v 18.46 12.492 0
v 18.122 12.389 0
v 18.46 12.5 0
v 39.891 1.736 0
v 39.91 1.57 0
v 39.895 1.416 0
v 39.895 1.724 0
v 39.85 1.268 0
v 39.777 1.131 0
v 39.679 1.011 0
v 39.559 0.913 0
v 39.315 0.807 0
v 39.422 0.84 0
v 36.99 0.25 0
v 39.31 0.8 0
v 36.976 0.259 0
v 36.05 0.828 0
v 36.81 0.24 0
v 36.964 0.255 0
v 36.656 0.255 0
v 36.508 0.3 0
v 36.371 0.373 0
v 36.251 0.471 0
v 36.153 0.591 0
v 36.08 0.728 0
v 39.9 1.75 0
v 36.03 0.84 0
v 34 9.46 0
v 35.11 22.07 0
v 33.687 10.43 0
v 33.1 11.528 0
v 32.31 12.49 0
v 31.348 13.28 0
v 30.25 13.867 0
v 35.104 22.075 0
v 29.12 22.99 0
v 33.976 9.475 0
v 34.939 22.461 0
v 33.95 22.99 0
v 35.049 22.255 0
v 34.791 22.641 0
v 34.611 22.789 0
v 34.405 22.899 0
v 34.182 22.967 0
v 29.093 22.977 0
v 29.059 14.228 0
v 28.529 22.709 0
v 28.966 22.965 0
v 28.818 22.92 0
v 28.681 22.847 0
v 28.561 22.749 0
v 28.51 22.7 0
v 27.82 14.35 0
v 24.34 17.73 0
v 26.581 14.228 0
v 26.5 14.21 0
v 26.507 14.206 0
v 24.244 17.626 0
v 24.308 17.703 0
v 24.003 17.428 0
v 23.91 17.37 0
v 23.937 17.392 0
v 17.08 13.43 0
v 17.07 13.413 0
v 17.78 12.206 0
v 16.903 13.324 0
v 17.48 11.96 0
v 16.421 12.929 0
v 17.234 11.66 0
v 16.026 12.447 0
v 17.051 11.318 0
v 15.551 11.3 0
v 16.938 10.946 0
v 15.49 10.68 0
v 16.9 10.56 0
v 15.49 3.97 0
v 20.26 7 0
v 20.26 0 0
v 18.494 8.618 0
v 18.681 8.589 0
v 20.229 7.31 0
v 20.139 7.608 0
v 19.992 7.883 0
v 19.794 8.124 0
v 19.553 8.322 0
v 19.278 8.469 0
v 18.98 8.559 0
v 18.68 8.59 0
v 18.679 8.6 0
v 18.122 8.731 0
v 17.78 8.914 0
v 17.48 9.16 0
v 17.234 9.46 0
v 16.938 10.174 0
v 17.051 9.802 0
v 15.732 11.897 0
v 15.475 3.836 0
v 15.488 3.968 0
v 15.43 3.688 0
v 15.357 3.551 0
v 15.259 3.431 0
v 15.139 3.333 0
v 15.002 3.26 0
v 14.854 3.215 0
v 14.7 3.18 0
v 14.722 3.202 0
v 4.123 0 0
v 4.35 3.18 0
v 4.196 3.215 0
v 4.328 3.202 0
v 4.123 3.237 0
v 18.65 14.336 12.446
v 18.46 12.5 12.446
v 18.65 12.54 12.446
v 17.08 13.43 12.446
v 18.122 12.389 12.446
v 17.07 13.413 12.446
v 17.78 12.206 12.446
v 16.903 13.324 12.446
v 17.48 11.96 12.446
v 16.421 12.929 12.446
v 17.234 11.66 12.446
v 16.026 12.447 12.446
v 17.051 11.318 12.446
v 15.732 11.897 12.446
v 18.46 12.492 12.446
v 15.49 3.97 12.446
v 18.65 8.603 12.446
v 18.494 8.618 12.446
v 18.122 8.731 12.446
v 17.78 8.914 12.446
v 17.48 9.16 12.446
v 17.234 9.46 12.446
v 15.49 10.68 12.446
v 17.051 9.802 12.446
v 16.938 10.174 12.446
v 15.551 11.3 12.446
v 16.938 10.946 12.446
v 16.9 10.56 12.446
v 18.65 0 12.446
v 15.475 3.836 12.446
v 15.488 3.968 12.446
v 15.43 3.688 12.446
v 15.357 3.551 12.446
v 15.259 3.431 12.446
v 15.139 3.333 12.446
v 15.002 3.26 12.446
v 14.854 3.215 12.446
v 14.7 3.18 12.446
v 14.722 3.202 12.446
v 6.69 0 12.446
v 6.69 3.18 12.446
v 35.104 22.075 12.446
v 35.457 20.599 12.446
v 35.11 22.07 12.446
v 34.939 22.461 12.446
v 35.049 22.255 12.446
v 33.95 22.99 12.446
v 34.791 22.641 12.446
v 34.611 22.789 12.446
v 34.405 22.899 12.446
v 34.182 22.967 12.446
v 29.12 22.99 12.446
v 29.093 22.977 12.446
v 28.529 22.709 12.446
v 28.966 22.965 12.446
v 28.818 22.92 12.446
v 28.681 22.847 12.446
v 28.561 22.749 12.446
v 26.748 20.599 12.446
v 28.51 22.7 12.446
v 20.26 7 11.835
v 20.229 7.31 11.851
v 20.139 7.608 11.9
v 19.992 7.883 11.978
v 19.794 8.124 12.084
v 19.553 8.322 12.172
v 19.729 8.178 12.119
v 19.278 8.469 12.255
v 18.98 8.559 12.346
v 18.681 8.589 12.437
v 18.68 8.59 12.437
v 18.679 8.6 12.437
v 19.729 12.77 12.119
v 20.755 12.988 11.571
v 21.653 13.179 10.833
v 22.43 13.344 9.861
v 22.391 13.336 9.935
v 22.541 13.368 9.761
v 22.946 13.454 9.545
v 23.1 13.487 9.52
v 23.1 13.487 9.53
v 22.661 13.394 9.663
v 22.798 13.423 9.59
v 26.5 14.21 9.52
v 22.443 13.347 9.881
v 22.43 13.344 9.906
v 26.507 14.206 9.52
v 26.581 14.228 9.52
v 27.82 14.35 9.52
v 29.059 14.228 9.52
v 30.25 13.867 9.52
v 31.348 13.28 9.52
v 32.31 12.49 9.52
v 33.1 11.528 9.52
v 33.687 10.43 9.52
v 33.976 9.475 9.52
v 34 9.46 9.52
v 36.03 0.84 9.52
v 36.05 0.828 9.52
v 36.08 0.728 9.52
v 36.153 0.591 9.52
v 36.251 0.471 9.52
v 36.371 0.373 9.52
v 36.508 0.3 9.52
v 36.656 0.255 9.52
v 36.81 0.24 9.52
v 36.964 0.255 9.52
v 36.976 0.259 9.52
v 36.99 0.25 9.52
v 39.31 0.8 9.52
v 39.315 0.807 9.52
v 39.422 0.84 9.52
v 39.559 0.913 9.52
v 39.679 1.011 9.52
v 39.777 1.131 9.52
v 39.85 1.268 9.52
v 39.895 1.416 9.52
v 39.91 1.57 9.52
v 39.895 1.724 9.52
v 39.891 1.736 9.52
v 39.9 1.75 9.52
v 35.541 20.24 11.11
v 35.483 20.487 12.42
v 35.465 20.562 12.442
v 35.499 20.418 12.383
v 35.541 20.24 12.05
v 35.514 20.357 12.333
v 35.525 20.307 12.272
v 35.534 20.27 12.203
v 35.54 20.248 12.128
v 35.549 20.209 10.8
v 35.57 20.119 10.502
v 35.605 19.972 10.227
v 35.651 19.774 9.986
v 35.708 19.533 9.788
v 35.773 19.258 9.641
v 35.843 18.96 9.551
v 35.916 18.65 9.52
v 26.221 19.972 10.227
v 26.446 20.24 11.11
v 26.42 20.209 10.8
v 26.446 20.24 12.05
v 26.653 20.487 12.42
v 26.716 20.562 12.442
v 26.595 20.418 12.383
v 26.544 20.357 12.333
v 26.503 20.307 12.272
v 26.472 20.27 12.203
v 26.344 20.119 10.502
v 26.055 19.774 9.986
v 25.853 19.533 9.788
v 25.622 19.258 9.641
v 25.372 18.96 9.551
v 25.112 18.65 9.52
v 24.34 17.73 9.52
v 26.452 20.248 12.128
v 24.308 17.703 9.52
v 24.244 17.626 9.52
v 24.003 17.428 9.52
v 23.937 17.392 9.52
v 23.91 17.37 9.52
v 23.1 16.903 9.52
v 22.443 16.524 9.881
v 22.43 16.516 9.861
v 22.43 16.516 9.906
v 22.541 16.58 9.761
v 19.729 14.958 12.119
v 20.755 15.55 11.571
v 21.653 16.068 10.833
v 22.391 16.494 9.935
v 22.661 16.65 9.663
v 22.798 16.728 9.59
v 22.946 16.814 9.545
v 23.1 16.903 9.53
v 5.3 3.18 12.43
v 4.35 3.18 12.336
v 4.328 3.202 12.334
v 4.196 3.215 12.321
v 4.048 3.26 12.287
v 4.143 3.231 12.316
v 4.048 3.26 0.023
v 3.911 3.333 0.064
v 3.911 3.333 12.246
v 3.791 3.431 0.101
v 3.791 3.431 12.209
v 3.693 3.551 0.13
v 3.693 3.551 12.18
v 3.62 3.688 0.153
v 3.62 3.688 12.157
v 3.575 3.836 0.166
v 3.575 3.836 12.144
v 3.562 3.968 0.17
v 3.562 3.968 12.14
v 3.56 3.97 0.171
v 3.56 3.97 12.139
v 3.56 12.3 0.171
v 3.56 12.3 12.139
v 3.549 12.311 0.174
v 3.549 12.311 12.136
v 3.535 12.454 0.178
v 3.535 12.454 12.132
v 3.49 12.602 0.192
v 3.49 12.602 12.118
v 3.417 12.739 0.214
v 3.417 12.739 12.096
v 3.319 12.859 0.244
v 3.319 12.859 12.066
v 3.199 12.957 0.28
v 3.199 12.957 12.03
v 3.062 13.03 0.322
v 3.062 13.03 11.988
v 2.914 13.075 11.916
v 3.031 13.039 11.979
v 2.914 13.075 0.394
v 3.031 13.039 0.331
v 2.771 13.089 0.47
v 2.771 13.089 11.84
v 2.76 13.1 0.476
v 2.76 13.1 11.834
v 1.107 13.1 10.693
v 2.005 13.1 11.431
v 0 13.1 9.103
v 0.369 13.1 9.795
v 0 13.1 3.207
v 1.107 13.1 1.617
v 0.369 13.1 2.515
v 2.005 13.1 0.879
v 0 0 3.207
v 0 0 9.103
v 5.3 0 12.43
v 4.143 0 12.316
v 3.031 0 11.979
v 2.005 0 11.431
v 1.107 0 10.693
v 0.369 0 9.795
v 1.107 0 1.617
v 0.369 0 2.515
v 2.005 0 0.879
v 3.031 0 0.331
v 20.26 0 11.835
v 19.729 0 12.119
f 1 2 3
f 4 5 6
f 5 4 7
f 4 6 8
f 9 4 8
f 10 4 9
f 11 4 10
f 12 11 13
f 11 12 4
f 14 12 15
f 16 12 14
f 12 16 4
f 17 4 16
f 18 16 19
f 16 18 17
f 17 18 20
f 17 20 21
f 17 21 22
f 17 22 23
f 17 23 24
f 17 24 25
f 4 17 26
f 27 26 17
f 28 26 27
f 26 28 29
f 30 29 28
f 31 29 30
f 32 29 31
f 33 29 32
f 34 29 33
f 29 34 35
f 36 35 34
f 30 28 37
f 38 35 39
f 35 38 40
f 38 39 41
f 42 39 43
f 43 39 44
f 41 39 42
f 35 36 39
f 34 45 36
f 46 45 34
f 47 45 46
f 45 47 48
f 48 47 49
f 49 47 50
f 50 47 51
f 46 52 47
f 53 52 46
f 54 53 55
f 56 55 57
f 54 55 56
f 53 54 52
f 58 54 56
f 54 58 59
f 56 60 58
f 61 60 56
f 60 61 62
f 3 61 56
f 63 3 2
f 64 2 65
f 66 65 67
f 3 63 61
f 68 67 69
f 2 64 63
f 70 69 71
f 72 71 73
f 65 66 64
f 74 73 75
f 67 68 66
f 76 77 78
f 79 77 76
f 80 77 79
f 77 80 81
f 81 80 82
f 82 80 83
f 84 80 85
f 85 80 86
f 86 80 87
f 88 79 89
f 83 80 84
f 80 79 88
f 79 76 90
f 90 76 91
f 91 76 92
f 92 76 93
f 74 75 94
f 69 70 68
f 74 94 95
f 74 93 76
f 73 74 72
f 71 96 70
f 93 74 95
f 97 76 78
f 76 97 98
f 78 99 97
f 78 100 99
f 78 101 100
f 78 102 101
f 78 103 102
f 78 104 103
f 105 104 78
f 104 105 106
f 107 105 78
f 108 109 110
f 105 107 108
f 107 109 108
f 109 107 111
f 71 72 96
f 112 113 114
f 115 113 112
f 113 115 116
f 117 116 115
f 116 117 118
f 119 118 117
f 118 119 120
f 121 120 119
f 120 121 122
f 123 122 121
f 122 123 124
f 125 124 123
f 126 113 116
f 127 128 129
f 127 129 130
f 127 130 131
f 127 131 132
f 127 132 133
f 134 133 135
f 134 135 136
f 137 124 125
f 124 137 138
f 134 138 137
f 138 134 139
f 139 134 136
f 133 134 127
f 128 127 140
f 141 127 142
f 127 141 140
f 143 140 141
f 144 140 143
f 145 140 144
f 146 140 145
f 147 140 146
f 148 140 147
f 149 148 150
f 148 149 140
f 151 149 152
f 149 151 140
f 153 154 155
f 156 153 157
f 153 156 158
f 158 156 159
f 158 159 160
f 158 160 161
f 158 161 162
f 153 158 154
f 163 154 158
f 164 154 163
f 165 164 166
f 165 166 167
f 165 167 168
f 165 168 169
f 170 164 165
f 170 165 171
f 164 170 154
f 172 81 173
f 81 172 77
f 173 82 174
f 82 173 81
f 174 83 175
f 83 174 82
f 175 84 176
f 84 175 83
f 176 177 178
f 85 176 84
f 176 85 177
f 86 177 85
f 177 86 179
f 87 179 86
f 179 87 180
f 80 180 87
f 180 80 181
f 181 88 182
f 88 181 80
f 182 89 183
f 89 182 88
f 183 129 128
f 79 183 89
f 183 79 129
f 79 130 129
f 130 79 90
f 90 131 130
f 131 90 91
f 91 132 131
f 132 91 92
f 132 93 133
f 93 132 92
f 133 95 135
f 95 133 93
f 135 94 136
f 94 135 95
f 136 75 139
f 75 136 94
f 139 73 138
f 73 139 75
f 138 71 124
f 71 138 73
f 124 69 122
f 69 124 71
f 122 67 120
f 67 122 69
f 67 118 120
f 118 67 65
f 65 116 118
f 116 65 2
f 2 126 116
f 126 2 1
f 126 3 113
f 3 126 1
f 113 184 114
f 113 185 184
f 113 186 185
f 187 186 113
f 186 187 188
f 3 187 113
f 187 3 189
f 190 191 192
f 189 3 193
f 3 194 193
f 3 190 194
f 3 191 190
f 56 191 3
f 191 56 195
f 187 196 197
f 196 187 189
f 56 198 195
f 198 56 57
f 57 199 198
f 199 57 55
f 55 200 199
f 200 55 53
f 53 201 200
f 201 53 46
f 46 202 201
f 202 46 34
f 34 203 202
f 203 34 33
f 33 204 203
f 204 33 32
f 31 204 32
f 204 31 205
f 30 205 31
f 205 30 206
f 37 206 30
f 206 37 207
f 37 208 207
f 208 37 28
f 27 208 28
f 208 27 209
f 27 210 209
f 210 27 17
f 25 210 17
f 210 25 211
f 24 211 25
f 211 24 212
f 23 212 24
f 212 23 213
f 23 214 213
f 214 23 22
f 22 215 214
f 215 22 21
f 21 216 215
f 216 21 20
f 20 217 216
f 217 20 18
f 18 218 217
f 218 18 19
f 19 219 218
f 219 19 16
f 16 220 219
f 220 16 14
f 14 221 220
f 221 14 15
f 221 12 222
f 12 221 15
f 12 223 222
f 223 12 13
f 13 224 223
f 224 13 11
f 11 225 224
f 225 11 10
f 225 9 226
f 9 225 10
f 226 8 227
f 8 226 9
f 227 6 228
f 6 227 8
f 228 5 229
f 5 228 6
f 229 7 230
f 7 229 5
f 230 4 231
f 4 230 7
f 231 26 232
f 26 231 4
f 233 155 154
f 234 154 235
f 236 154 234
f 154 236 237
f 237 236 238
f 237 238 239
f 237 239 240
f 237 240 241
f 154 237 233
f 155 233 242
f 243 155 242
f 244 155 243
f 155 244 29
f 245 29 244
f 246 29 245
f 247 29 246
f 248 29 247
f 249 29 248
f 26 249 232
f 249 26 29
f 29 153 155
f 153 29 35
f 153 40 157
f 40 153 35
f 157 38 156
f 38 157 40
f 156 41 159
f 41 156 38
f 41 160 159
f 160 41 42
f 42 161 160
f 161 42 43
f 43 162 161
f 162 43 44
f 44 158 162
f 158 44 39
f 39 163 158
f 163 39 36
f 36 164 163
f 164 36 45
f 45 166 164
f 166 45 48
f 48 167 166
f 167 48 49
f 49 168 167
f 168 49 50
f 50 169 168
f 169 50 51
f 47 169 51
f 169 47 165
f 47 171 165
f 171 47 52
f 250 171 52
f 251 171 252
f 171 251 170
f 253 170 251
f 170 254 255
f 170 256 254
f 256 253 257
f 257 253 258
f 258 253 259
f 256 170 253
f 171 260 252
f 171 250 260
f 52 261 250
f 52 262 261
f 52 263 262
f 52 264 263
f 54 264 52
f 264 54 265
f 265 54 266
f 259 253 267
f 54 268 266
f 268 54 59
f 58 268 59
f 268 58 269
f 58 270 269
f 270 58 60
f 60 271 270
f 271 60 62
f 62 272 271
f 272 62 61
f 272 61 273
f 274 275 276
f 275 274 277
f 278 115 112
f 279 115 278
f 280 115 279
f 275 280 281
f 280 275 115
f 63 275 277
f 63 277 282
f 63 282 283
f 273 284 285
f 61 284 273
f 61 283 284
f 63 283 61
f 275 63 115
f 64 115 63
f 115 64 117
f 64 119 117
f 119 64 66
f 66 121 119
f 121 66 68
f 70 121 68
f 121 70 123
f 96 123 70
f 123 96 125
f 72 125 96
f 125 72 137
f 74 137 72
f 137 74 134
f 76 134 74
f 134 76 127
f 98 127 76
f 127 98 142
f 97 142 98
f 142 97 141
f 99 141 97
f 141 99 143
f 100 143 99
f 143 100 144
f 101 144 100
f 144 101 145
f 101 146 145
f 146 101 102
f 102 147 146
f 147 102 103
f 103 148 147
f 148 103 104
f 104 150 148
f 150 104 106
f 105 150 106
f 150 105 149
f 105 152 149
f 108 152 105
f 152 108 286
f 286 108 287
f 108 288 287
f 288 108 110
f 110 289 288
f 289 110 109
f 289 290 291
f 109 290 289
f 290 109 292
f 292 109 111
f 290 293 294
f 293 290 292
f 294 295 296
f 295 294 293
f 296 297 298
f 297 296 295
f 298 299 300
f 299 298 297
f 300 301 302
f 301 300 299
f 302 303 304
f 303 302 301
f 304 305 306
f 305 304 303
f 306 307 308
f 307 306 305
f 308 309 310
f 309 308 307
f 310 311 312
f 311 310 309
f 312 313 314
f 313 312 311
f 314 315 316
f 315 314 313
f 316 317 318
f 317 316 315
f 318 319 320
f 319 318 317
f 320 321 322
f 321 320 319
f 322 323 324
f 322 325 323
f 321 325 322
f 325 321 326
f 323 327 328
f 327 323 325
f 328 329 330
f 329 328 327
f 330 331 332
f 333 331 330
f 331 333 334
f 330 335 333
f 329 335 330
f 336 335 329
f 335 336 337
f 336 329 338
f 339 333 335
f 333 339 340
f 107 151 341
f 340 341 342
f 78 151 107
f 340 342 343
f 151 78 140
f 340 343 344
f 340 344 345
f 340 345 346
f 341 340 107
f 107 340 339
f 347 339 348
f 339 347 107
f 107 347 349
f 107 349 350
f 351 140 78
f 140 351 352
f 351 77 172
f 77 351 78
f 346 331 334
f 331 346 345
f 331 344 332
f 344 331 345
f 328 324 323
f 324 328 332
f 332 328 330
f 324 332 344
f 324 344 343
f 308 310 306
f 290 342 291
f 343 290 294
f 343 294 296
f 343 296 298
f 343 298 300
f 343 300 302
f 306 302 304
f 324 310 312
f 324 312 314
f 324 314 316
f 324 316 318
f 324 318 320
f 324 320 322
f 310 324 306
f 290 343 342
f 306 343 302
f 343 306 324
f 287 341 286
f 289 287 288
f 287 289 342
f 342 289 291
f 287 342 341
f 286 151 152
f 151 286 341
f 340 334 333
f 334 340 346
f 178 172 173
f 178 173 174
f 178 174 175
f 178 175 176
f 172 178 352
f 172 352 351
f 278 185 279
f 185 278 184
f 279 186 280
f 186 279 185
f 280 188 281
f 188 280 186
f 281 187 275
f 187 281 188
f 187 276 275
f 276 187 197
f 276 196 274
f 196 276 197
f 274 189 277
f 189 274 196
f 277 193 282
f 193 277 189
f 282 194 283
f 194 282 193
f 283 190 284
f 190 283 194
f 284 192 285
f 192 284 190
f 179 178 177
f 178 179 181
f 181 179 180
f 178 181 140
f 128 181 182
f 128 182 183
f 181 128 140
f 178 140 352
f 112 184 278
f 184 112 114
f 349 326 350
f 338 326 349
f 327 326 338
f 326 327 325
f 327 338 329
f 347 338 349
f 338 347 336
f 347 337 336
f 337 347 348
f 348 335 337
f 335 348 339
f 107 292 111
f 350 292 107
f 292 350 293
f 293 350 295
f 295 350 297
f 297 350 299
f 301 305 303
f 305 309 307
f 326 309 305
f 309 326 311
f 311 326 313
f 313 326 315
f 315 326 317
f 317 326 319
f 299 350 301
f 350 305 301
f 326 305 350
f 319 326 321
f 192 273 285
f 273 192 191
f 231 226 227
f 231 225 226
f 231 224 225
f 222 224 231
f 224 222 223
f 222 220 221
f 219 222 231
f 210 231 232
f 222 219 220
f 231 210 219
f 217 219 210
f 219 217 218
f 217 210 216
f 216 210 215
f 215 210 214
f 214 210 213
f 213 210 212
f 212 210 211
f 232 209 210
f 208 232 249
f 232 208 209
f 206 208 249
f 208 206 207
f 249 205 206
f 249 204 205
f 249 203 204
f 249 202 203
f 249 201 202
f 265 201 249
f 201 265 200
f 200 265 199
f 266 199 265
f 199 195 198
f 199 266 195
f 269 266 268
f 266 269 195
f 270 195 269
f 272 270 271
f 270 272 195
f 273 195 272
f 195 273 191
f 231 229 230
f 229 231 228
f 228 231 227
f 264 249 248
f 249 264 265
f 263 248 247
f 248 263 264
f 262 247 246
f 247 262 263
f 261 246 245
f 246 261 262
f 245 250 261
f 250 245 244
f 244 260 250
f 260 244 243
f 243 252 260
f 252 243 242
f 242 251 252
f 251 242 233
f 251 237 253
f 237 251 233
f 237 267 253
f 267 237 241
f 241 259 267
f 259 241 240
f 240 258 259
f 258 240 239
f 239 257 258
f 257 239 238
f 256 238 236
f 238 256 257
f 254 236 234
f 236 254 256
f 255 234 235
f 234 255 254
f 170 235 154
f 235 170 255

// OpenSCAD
module c(r,x,y){
    translate([x,y])circle(r=r,$fn=32);
}
module s(h,w,x,y){
    translate([x,y])square([h,w]);
}
module z(){
    z1 = [[0,0],[0,13.1],[2.76,13.1],[3.56,12.3],[3.56,3.97],[4.35,3.18],[14.7,3.18],[15.49,3.97],[15.49,10.68],[17.08,13.43],[23.91,17.37],[24.34,17.73],[28.51,22.7],[29.12,22.99],[33.95,22.99],[35.11,22.07],[39.9,1.75],[39.31,.8],[36.99,.25],[20.26,0]];    
    z2 = [[36.99,0],[36.99,.25],[36.03,.84],[34,9.46],[26.5,14.21],[18.46,12.5],[18.68,8.59],[20.26,7],[20.26,0]];
    difference(){
        union(){
            polygon(z1);
            c(.79,2.76,12.3);
            c(3.18,18.67,10.68);
            c(.79,29.12,22.19);
            c(1.19,33.95,21.8);
            c(.79,39.12,1.57);
        }
        c(.79,4.35,3.99);
        c(.79,14.7,3.99);
        c(1.59,23.12,18.75);
        c(1.98,18.88,10.56);
        c(6.35,27.82,8);
        polygon(z2);
    }
    c(.79,36.81,1.03);
    c(1.59,18.67,7);
}
module y(){
    difference(){
        s(22.43,12.45,0,0);
        hull(){
            s(1,1,21.43,0);
            c(5.93,5.3,6.5);
            c(5.93,5.3,5.81);
            c(5.93,17.46,6.64);
        }
    }
    c(.79,23.1,10.32);
    s(1.59,2.13,22.3,10.32);
}
module x(){
    difference(){
        s(.4,.4,-12.45,20.24);
        c(.4,-12.05,20.64);
    }
    hull(){
        s(1,1,-12.7,19.24);
        s(3.18,1,-12.7,0,0);
        c(1.59,-11.11,18.65);
    }
}

difference(){
    linear_extrude(height=12.446){z();}
    rotate([90,0,0])
    translate([0,0,-23])
    linear_extrude(height=23)
    y();
    
    translate([23.1,0,0])
    rotate([0,90,0])
    linear_extrude(height=17)
    x();
}
